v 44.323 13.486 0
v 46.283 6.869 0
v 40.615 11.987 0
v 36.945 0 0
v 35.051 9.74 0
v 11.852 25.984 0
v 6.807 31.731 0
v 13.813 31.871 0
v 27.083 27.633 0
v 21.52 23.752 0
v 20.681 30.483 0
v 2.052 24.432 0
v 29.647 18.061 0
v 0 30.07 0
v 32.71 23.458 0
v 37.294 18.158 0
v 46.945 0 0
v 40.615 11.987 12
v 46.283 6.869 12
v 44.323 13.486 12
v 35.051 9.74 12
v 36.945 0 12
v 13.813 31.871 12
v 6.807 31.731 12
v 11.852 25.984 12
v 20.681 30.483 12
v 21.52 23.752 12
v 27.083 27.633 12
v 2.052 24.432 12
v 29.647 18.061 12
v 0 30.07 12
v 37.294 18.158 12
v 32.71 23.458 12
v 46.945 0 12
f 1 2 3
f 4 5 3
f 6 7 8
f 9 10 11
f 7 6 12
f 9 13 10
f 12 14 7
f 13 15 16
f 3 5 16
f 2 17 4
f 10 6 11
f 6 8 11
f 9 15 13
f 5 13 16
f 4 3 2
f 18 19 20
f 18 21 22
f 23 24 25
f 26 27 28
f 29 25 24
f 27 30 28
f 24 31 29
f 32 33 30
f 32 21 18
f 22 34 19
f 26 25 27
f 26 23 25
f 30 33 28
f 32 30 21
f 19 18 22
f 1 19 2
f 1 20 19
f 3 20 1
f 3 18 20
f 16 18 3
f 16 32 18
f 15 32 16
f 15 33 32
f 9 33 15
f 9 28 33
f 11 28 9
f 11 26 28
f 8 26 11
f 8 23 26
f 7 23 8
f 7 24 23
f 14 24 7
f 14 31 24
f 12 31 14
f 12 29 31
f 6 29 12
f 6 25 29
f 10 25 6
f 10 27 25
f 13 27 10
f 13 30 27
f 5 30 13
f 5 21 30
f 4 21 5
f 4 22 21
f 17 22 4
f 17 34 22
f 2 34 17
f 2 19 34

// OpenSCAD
$fn = 32;

// ----------------------------------------------------------------------
// Arc stop: segment, 12 mm thick
// ----------------------------------------------------------------------

// --- parameters (mm) ---
profile_height = 12;      // extrusion height
profile_points = 17;      // points of the closed outline

profile = [[46.945, 0], [46.283, 6.869], [44.323, 13.486], [40.615, 11.987], [37.294, 18.158], [32.71, 23.458], [27.083, 27.633], [20.681, 30.483], [13.813, 31.871], [6.807, 31.731], [0, 30.07], [2.052, 24.432], [11.852, 25.984], [21.52, 23.752], [29.647, 18.061], [35.051, 9.74], [36.945, 0]];  // single closed polygon, 17 points, counter clockwise

// --- the one profile operation ---
linear_extrude(height = profile_height) polygon(points = profile);
